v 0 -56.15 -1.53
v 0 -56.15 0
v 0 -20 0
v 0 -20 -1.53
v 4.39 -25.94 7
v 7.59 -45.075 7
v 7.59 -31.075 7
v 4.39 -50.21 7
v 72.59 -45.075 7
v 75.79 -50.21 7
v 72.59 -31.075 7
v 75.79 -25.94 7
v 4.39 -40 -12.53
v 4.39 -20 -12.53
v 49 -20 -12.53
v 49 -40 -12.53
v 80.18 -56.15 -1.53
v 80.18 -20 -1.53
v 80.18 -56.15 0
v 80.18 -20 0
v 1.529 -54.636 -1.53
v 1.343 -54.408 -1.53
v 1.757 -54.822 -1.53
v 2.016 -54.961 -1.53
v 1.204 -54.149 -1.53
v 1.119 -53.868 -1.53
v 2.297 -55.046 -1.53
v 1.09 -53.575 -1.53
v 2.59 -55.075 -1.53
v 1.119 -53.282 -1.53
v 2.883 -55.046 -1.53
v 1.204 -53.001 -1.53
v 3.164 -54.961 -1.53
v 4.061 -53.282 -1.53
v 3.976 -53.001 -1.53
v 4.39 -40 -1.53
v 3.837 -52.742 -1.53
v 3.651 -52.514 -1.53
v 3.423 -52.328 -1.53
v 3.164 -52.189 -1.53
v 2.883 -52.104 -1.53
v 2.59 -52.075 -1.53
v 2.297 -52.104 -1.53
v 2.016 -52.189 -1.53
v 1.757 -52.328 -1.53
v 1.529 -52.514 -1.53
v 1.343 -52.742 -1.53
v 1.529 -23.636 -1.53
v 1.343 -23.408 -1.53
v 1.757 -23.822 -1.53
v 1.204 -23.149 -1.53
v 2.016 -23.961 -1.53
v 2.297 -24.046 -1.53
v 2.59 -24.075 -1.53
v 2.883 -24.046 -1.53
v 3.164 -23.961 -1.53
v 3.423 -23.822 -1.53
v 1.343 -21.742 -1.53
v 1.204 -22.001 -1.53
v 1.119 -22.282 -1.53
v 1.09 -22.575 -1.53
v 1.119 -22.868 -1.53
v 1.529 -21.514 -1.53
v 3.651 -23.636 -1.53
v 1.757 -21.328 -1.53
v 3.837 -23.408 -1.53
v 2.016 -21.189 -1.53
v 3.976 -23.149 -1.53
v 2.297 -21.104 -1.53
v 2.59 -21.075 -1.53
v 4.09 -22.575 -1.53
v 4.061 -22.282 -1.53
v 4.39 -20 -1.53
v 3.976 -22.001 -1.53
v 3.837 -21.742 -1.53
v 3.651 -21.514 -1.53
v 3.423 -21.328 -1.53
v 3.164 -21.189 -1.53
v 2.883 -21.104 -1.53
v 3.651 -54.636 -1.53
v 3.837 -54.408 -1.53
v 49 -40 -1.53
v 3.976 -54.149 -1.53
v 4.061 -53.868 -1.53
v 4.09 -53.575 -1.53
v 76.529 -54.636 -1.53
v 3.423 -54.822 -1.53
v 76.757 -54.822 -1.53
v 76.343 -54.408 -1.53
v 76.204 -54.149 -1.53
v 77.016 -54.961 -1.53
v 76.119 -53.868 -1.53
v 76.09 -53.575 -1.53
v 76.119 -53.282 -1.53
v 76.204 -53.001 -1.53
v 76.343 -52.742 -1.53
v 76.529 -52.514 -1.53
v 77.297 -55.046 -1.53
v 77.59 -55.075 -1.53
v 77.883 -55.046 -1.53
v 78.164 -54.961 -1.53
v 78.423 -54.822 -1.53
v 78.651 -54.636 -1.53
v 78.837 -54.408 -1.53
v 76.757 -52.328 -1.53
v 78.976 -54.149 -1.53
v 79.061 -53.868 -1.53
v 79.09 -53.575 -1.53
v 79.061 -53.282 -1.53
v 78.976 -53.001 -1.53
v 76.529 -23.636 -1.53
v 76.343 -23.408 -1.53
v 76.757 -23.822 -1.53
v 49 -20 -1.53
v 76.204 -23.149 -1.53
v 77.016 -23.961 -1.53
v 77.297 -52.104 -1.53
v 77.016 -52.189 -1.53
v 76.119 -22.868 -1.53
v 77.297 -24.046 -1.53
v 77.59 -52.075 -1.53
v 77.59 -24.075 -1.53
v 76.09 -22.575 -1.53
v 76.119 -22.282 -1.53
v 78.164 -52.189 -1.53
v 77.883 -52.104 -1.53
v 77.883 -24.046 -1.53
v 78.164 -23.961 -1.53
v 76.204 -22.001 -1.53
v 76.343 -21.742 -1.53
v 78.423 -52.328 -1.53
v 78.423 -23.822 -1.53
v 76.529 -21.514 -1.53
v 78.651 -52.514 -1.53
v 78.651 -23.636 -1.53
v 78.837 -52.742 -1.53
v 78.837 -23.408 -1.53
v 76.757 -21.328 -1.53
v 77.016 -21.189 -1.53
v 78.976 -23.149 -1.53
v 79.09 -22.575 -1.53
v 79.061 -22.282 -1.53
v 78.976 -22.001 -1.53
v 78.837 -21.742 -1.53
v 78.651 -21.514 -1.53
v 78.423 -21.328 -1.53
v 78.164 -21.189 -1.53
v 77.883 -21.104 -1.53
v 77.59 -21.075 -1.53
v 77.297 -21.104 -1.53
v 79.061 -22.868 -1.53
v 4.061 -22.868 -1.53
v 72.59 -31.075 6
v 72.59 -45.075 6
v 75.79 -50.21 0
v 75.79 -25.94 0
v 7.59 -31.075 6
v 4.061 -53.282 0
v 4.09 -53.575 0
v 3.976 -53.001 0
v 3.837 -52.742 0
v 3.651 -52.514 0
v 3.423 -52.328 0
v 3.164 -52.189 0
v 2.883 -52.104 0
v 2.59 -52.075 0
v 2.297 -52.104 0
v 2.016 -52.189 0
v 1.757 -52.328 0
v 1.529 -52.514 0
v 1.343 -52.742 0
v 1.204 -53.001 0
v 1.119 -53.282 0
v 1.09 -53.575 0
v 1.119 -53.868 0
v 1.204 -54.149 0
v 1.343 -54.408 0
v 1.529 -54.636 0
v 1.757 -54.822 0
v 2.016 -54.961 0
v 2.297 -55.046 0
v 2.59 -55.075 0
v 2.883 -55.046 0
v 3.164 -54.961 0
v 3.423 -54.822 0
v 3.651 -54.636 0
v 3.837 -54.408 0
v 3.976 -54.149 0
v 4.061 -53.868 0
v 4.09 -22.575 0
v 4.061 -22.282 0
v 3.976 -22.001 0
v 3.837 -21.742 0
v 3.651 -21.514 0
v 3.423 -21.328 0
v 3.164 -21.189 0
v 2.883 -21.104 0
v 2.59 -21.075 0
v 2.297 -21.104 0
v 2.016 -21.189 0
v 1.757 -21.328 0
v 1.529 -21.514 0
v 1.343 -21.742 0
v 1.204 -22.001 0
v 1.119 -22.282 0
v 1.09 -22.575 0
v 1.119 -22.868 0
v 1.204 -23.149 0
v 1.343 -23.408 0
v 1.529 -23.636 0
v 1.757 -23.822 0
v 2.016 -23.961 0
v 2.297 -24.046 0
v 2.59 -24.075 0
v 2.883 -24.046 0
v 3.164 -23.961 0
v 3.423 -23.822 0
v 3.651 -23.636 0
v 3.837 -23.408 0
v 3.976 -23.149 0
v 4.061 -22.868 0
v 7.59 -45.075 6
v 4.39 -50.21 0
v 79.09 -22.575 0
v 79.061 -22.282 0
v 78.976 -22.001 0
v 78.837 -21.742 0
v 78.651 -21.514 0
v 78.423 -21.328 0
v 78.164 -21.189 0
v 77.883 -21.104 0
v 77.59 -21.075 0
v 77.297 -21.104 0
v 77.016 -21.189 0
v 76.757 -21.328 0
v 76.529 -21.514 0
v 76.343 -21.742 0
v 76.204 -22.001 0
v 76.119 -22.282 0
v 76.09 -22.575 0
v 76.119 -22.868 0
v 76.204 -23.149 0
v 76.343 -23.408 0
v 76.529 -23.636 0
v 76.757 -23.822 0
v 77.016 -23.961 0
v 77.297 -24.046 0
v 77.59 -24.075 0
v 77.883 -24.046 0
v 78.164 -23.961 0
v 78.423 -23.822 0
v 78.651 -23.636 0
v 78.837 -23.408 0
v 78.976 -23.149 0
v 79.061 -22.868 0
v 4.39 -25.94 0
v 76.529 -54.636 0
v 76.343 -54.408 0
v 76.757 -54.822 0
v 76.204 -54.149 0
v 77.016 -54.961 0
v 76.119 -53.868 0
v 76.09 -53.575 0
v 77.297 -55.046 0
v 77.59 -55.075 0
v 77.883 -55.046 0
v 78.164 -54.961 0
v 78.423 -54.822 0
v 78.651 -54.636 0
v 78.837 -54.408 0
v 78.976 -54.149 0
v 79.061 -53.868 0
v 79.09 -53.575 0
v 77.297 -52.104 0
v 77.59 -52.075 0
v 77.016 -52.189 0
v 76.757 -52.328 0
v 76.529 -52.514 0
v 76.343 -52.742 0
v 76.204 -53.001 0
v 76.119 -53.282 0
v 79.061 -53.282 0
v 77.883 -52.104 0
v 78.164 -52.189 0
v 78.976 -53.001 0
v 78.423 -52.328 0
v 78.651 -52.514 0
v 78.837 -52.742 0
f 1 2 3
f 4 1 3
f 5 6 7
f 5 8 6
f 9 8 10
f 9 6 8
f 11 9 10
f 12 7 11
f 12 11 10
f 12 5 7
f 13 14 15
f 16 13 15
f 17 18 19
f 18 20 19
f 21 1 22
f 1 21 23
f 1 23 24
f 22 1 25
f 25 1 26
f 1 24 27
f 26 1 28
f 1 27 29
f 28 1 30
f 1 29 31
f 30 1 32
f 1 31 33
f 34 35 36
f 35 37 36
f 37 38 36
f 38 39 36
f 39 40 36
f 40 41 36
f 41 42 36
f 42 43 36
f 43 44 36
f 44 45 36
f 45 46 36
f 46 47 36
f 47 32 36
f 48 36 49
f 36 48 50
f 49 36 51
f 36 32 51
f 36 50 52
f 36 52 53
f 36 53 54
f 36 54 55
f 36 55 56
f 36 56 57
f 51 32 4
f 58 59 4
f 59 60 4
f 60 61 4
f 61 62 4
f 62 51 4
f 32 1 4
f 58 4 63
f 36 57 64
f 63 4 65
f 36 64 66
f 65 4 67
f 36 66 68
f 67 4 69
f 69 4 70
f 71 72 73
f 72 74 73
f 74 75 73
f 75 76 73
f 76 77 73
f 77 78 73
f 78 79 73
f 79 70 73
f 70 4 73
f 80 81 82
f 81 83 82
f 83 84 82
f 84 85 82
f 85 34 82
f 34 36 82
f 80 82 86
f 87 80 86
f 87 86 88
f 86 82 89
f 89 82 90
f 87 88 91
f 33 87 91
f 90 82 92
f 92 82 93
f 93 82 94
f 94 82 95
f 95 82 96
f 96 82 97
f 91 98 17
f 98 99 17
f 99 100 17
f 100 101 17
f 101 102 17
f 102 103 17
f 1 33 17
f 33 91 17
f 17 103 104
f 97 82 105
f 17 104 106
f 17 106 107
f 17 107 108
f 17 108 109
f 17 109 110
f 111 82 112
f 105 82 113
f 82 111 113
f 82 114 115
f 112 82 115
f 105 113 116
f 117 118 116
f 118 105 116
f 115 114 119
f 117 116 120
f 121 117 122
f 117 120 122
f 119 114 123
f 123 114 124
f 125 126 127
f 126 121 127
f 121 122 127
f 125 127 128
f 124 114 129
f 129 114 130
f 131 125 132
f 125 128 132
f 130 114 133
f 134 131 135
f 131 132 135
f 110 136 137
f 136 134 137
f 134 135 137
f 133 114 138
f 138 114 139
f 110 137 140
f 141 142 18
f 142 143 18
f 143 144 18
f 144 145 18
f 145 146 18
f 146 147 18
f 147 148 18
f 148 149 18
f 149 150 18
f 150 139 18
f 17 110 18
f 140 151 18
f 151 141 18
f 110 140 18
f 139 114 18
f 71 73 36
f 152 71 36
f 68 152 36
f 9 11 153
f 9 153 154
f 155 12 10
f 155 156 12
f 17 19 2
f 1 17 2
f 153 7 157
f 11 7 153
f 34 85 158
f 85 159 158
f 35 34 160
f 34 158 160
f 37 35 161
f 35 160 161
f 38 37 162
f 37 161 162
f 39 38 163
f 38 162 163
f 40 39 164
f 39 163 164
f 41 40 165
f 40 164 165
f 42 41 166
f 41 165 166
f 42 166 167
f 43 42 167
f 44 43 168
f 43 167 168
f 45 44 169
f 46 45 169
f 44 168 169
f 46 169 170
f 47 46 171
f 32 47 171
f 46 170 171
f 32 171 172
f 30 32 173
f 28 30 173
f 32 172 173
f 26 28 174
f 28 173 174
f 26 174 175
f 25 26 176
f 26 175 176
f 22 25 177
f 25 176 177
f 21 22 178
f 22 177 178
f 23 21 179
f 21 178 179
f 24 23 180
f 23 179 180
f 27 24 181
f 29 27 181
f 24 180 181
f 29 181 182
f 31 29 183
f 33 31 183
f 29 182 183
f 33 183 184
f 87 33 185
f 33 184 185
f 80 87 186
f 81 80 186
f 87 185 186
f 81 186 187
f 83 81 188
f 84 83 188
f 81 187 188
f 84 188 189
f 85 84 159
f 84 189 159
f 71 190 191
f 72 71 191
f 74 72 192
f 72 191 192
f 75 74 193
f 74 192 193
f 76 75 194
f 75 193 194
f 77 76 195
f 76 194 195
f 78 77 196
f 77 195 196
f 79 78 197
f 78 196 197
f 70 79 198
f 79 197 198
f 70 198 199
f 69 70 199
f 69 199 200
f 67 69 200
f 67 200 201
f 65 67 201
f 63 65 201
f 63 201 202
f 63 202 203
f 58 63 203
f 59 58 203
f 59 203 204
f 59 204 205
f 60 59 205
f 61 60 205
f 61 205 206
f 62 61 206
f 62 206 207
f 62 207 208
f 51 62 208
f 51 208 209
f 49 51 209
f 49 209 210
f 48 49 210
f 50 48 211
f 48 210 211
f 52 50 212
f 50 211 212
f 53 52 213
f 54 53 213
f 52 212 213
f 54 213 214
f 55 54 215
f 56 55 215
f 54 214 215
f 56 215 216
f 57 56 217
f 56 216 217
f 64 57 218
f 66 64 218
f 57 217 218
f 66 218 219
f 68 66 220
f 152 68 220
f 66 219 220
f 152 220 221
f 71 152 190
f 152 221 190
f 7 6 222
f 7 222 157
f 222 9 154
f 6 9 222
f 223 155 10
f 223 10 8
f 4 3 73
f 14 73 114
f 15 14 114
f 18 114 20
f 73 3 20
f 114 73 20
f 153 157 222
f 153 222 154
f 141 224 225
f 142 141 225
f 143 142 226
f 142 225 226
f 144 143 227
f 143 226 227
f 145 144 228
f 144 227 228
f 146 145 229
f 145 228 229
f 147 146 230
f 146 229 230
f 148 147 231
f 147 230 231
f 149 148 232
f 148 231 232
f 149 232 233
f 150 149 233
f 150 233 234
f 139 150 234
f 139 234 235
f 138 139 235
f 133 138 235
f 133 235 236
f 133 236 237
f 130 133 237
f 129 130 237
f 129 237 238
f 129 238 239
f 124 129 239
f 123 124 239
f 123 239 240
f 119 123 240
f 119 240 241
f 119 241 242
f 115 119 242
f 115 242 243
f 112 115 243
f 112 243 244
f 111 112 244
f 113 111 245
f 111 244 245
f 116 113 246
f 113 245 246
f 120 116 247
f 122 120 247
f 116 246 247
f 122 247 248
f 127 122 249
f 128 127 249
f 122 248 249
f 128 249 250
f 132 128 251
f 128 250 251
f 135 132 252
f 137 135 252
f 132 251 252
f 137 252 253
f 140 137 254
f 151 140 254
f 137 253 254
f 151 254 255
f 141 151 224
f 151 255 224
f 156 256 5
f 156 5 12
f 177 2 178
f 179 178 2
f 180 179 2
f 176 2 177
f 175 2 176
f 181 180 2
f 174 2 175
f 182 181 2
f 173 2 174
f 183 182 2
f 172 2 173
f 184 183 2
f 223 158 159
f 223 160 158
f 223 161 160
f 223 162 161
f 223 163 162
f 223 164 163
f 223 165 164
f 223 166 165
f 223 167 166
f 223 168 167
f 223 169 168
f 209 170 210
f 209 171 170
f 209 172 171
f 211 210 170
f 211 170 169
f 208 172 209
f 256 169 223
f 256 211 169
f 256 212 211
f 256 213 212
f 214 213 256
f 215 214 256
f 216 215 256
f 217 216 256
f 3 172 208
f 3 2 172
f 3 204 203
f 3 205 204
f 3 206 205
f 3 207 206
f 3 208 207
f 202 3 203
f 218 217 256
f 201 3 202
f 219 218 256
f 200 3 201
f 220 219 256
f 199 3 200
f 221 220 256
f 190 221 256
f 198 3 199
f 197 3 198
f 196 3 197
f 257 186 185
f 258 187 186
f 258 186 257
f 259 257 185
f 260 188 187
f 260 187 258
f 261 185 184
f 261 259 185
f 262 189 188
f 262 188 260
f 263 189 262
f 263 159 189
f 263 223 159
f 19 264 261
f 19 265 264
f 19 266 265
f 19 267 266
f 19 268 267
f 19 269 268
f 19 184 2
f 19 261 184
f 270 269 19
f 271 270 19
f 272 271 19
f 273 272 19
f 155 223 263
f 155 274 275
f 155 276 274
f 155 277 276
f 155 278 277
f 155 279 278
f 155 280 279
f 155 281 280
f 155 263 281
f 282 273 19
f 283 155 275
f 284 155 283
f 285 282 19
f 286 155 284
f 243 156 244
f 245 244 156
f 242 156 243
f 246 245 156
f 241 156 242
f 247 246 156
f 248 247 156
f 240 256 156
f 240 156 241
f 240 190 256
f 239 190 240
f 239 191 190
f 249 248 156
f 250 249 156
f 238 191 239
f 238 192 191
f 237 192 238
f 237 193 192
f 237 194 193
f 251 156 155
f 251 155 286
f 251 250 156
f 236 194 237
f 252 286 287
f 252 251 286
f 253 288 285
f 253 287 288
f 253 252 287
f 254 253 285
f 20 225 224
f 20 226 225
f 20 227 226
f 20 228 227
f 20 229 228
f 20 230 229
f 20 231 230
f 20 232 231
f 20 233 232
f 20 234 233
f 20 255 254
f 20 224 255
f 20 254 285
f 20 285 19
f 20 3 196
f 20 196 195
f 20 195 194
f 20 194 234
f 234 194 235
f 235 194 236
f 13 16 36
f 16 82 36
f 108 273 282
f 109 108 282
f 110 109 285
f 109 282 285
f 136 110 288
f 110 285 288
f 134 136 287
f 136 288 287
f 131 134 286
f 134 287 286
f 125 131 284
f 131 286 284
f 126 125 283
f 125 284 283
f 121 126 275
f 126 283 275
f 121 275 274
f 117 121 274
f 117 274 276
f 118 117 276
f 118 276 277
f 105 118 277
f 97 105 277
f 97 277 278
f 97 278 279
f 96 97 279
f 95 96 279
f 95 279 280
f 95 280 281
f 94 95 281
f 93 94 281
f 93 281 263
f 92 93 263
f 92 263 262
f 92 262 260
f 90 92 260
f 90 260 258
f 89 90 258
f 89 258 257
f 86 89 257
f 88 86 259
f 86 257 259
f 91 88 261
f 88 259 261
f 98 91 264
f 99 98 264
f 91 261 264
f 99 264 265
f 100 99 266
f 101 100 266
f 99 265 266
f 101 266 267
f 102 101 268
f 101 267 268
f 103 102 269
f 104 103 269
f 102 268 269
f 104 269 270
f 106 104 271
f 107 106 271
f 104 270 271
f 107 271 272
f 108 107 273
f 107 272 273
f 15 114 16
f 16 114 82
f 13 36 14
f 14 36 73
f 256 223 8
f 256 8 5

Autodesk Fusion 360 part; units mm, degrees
sketch "Sketch1" plane through (0, 0, 0) normal (0, 0, 1) x (1, 0, 0)
  line L0 (0, -20) -> (80.18, -20)
  line L1 (80.18, -20) -> (80.18, -56.15)
  line L2 (80.18, -56.15) -> (0, -56.15)
  line L3 (0, -56.15) -> (0, -20)
  line L4 (4.39, -25.94) -> (75.79, -25.94)
  line L5 (75.79, -25.94) -> (75.79, -50.21)
  line L6 (75.79, -50.21) -> (4.39, -50.21)
  line L7 (4.39, -50.21) -> (4.39, -25.94)
  line L8 (0, -20) -> (49, -20)
  line L9 (49, -20) -> (49, -40)
  line L10 (49, -40) -> (0, -40)
  line L11 (0, -40) -> (0, -20)
  line L12 (75.79, -38.075) -> (80.18, -38.075) construction
  line L13 (40.09, -25.94) -> (40.09, -20) construction
  line L14 (7.59, -31.075) -> (72.59, -31.075)
  line L15 (72.59, -31.075) -> (72.59, -45.075)
  line L16 (72.59, -45.075) -> (7.59, -45.075)
  line L17 (7.59, -45.075) -> (7.59, -31.075)
  line L18 (7.59, -38.075) -> (4.39, -38.075) construction
  line L19 (40.09, -31.075) -> (40.09, -25.94) construction
  circle A0 centre (2.59, -22.575) radius 1.5
  line L20 (2.59, -24.075) -> (7, -24.075) construction
  line L21 (4.09, -22.575) -> (4.09, -25) construction
  circle A1 centre (77.59, -22.575) radius 1.5
  line L22 (77.59, -24.075) -> (73.18, -24.075) construction
  line L23 (76.09, -22.575) -> (76.09, -25) construction
  circle A2 centre (77.59, -53.575) radius 1.5
  line L24 (76.09, -53.575) -> (76.09, -51.15) construction
  line L25 (77.59, -52.075) -> (73.18, -52.075) construction
  line L26 (2.59, -52.075) -> (7, -52.075) construction
  line L27 (4.09, -53.575) -> (4.09, -51.15) construction
  circle A3 centre (2.59, -53.575) radius 1.5
  line L28 (4.39, -25.94) -> (4.39, -20)
  line L29 (4.39, -25.94) -> (0, -25.94)
  line L30 (4.39, -34.7) -> (0, -34.7)
  line L31 (0, -34.7) -> (0, -40)
  line L32 (0, -40) -> (4.39, -40)
  line L33 (4.39, -40) -> (4.39, -34.7)
  dimension "d1020" = 20
  dimension "d1021" = 80.18
  dimension "d1022" = 36.15
  dimension "d1023" = 24.27
  dimension "d1024" = 71.4
  dimension "d1025" = 20
  dimension "d1026" = 49
  dimension "d1027" = 65
  dimension "d1028" = 14
  dimension "d1039" = 3
  dimension "d1040" = 28
  dimension "d1041" = 72
  dimension "d1212" = 14.7
extrude "Extrude1" add sketch "Sketch1" against normal blind 1.53
extrude "Extrude2" add sketch "Sketch1" against normal blind 11 from surface at -1.53 contours L0 L4 L8 L9 L28 | L4 L7 L9 L10 L14 L17 L33 | L9 L10 L14 L17
extrude "Extrude3" add sketch "Sketch1" along normal blind 7 contours L4 L7 L9 L10 L14 L17 L33 | L4 L5 L6 L7 L9 L10 L14 L15 L16 L17 | L9 L10 L14 L15 L16 L17 | L9 L10 L14 L17
extrude "Extrude4" cut sketch "Sketch1" against normal blind 1 from surface at 7 contours L9 L10 L14 L15 L16 L17 | L9 L10 L14 L17
